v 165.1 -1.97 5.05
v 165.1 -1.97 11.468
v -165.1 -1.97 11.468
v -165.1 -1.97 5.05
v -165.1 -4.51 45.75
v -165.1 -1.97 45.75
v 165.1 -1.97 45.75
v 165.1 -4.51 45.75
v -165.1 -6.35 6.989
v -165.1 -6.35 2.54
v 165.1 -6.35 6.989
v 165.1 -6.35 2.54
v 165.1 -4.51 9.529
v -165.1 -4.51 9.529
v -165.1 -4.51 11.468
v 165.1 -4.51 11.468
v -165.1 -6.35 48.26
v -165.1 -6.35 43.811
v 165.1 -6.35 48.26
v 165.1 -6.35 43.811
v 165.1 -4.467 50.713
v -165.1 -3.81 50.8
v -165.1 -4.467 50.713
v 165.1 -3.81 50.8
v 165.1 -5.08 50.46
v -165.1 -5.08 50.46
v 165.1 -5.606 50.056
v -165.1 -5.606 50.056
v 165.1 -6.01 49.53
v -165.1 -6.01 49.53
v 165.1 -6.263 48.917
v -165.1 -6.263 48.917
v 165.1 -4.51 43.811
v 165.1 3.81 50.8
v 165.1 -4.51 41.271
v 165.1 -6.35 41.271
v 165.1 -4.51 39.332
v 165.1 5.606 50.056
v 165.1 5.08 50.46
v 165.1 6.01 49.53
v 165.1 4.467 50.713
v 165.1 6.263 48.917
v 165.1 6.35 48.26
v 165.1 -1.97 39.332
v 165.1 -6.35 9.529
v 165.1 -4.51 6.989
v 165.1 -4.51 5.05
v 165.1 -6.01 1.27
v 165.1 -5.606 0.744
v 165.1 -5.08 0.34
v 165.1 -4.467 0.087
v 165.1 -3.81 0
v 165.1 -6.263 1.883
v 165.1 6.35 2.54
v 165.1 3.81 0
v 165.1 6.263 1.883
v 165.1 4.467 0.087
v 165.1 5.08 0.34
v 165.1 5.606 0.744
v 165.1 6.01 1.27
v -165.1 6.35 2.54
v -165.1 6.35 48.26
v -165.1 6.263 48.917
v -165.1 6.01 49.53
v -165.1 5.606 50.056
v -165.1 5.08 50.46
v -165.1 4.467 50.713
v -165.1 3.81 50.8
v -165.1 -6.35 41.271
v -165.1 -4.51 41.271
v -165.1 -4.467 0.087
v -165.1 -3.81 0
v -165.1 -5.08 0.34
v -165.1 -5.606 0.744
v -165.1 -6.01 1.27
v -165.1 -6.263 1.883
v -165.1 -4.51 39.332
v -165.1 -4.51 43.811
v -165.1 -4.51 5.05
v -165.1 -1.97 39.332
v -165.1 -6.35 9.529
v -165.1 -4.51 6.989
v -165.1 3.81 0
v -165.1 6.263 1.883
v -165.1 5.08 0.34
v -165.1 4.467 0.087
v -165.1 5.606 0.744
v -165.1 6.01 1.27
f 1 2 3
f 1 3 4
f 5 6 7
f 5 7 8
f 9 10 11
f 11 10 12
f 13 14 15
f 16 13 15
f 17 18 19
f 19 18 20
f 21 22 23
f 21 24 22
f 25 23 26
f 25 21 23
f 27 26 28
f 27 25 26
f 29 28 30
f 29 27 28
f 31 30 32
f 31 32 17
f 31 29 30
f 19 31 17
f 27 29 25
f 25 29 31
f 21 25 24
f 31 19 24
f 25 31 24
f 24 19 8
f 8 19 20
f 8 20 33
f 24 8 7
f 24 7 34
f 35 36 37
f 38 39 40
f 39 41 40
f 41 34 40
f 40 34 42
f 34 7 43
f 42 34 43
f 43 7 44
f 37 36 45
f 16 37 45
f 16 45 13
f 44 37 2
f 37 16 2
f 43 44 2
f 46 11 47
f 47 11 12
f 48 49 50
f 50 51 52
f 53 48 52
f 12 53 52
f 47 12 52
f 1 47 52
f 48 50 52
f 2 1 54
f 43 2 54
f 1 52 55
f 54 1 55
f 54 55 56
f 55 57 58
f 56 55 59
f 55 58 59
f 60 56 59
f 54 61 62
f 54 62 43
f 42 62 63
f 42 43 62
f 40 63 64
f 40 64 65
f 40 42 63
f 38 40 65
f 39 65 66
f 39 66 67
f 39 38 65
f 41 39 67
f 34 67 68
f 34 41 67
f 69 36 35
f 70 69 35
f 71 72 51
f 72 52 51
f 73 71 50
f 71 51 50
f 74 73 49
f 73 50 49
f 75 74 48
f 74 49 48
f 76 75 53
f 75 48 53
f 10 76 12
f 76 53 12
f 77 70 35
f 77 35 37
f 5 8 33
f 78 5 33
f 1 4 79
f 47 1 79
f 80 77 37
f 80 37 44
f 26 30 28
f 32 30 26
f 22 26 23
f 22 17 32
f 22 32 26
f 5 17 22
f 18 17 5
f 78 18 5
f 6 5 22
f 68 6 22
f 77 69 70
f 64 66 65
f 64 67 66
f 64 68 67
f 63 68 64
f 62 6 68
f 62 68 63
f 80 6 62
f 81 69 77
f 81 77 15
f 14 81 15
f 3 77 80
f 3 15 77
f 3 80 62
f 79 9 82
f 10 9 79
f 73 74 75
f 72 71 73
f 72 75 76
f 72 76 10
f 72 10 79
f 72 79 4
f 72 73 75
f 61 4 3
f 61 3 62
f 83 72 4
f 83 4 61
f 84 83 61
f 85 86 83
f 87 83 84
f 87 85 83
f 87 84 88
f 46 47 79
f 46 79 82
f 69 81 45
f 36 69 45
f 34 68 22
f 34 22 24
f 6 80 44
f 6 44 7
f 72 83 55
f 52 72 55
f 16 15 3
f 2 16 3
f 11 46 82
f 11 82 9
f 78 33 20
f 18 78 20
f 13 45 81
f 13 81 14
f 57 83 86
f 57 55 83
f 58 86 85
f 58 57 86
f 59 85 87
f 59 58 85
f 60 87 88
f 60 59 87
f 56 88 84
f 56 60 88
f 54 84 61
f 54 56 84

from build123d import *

# Parameters (mm, degrees)
SKETCH1_W           = 330.2
SKETCH1_H           = 12.7
BOSS_EXTRUDE1_DEPTH = 50.8
CUT_EXTRUDE1_REACH  = 336.145
FILLET1_R           = 2.54


with BuildPart() as part:
    # Sketch1 → Boss-Extrude1 (new body)
    with BuildSketch(Plane.XY):
        Rectangle(SKETCH1_W, SKETCH1_H)
    extrude(amount=BOSS_EXTRUDE1_DEPTH)

    # Sketch2 → Cut-Extrude1 (cut, up to next)
    with BuildSketch(Plane.ZY.offset(165.1), mode=Mode.PRIVATE) as cut_extrude1_sk1:
        Polygon((41.27098203, -6.35), (41.27098203, -4.509591524), (39.332279131, -4.509591524), (39.332279131, -1.969591524), (45.749684928, -1.969591524), (45.749684928, -4.509591524), (43.81098203, -4.509591524), (43.81098203, -6.35), align=None)
    cut_extrude1_tool1 = extrude(cut_extrude1_sk1.sketch, amount=-CUT_EXTRUDE1_REACH, mode=Mode.PRIVATE) & part.part
    cut_extrude1 = cut_extrude1_tool1.solids().sort_by_distance((-165.1, -3.72772, 42.540982))[0]
    add(cut_extrude1, mode=Mode.SUBTRACT)

    # Mirror1: Cut-Extrude1 across plane
    add(cut_extrude1.mirror(Plane.XY.offset(25.4)), mode=Mode.SUBTRACT)

    # Fillet1
    fillet1_edges = [part.edges().sort_by_distance(p)[0] for p in [
        (0, 6.35, 50.8),
        (0, 6.35, 0),
        (0, -6.35, 0),
        (0, -6.35, 50.8),
    ]]
    fillet(fillet1_edges, radius=FILLET1_R)


solid = part.part
